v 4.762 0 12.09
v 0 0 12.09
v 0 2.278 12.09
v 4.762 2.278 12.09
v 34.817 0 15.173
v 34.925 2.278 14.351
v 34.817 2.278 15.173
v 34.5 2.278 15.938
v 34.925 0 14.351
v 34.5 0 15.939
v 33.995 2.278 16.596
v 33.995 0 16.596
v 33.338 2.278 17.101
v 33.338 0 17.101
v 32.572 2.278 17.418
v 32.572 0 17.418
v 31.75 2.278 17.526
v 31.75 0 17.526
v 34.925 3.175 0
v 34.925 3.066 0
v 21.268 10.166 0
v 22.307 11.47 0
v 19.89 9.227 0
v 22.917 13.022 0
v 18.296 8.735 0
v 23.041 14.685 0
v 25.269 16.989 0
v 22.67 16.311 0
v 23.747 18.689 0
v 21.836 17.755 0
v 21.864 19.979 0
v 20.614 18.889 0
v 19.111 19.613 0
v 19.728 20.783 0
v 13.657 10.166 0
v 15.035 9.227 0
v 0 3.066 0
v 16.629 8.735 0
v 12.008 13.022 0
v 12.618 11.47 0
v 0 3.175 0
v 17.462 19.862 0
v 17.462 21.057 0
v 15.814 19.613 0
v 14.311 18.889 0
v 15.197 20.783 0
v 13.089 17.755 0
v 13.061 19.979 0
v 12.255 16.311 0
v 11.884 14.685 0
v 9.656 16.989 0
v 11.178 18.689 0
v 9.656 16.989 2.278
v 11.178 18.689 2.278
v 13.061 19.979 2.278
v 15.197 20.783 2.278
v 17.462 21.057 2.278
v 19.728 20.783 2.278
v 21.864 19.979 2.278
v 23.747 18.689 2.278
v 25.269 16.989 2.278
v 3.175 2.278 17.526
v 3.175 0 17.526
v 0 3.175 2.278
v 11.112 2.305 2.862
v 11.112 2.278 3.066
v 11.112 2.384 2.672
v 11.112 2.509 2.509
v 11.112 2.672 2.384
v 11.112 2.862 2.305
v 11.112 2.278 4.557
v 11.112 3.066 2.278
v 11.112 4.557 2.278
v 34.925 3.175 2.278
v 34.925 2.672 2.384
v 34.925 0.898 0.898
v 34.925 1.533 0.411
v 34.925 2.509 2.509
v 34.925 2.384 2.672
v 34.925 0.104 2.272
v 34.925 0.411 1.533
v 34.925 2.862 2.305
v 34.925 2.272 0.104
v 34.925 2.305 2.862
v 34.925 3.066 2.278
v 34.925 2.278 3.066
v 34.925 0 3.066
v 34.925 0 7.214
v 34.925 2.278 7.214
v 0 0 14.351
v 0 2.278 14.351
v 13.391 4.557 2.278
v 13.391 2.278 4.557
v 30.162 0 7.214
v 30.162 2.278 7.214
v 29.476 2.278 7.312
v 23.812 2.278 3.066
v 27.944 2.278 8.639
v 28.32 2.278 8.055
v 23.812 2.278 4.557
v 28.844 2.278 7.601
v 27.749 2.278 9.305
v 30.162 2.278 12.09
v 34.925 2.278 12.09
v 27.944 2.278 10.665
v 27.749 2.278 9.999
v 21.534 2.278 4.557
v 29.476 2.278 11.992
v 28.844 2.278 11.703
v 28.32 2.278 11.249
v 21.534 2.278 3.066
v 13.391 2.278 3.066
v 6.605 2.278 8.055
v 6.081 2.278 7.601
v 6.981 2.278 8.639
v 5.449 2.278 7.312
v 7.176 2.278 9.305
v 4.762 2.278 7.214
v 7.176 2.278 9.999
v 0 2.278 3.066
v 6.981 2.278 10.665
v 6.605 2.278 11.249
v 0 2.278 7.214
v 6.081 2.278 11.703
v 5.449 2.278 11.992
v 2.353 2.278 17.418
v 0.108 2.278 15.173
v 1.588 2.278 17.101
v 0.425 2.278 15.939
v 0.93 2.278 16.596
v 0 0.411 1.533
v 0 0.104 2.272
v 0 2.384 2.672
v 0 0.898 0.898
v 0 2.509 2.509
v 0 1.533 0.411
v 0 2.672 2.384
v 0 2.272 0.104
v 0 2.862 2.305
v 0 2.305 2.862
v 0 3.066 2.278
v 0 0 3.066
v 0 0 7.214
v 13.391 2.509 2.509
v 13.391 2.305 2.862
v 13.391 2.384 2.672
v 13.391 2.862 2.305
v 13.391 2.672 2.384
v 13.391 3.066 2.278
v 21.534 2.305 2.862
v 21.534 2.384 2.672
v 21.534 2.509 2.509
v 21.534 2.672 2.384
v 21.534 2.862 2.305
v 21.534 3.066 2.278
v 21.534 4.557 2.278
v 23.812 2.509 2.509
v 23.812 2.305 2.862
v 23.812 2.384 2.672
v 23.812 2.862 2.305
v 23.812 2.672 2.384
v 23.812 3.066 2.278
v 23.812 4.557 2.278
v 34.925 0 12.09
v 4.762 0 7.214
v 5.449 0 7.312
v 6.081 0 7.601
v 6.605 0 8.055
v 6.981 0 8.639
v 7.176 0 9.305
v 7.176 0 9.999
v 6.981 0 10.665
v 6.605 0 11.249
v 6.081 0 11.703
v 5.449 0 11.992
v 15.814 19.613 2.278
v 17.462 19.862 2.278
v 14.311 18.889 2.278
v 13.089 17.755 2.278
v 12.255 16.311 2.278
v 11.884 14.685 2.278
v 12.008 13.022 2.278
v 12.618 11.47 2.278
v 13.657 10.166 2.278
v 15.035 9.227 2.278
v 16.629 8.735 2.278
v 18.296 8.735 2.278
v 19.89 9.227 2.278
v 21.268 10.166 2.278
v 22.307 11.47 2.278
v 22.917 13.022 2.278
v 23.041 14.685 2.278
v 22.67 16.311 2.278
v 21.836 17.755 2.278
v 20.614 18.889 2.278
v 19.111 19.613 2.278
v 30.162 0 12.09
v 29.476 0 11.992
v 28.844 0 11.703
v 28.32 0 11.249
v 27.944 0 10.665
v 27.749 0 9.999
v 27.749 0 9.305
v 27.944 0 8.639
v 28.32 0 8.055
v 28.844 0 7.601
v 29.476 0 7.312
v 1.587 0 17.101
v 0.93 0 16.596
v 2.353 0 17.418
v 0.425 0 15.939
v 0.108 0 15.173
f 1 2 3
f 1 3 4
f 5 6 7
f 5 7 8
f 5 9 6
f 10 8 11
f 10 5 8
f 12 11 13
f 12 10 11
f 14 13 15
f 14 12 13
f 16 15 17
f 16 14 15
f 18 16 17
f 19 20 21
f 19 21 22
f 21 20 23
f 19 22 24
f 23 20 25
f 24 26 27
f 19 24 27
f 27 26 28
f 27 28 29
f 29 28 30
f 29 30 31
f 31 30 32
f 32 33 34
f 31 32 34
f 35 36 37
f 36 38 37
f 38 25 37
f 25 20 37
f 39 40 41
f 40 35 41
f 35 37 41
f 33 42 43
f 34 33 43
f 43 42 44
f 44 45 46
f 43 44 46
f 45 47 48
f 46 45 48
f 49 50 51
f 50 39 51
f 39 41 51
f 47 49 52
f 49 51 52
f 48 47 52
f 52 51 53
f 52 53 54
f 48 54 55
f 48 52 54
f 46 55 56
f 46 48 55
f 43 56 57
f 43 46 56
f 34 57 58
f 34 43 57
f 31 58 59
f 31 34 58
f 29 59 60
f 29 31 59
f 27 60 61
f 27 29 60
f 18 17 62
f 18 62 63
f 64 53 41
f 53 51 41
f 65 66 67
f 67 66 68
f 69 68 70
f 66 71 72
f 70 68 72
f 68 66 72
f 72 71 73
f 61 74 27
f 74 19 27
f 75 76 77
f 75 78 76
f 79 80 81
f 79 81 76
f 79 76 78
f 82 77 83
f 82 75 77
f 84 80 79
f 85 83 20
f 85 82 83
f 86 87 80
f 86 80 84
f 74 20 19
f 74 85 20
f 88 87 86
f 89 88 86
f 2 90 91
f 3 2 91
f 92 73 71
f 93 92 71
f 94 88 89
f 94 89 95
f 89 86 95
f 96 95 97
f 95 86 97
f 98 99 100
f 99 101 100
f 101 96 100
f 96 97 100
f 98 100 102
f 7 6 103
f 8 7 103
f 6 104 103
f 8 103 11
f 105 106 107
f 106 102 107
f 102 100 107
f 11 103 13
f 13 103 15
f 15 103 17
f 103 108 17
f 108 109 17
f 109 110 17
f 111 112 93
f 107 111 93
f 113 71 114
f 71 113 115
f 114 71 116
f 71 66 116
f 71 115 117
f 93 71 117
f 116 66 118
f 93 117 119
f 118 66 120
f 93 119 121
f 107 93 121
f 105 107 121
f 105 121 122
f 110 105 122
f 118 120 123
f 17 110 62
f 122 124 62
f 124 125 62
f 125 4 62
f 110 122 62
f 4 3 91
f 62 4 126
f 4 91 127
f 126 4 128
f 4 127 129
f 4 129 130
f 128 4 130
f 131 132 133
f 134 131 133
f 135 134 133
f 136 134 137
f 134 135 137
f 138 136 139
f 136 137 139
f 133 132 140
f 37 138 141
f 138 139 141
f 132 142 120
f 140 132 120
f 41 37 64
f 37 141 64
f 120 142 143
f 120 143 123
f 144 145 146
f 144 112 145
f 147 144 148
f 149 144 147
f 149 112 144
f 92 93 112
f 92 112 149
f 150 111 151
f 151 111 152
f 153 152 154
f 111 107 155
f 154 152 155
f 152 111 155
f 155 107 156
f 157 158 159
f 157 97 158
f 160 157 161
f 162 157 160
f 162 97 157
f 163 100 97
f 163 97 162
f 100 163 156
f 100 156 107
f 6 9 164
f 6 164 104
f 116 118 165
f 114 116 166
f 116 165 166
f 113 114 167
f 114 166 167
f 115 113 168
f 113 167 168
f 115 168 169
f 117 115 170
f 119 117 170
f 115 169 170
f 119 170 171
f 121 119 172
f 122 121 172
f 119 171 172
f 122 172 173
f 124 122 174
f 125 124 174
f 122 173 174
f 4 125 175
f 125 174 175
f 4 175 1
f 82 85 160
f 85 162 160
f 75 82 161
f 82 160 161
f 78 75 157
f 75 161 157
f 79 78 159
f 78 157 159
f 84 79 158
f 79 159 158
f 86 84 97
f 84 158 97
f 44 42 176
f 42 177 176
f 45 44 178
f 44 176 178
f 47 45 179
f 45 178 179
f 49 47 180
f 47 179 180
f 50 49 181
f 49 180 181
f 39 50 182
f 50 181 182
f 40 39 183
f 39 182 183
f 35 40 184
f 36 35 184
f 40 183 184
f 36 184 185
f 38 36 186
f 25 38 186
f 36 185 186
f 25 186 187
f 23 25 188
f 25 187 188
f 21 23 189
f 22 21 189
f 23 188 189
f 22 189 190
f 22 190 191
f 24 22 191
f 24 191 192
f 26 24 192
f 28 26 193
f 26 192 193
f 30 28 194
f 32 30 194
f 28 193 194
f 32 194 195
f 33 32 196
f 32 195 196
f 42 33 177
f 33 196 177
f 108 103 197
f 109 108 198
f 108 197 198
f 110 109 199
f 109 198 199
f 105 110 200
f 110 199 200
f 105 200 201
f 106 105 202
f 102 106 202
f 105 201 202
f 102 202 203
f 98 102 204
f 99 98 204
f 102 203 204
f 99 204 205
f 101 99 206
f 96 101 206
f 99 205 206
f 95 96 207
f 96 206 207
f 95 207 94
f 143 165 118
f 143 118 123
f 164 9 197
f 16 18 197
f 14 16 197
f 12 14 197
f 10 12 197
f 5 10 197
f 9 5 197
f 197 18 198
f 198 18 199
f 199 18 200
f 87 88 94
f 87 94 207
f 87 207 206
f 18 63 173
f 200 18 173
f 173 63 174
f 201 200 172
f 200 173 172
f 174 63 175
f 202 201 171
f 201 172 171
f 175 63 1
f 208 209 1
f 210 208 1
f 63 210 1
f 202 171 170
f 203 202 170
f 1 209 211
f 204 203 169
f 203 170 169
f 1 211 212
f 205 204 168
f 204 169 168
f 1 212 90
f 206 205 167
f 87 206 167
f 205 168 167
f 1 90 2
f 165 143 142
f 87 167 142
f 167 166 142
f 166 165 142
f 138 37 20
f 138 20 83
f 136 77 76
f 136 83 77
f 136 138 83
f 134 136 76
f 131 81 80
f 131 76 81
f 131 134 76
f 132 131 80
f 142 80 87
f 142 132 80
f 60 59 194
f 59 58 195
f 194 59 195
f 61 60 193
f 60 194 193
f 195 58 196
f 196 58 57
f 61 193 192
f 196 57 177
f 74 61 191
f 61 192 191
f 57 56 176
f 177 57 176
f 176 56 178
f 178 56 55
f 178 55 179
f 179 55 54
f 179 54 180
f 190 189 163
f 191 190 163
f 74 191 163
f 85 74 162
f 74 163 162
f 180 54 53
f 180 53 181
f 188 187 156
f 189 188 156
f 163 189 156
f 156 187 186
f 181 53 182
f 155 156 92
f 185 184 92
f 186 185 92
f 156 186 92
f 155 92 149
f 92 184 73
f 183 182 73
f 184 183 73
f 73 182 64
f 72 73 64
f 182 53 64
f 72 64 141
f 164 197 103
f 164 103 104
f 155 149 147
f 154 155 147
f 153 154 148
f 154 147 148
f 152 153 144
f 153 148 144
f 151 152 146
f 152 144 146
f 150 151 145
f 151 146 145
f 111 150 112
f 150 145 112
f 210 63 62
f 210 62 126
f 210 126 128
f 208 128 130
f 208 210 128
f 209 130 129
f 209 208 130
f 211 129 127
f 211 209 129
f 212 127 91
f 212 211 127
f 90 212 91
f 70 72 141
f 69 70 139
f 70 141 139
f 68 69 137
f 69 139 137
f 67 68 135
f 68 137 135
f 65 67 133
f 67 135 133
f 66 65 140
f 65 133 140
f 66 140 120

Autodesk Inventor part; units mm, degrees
sketch "Sketch_1" plane through (0, 0, 0) normal (1, 0, 0) x (0, 1, 0)
  line L0 (0, 17.526) -> (0, 3.0658)
  arc A0 (0, 3.0658) -> (3.0658, 0) centre (3.0658, 3.0658) ccw
  line L1 (3.0658, 0) -> (25.2679, 0)
  line L2 (25.2679, 0) -> (25.2679, 2.2784)
  line L3 (25.2679, 2.2784) -> (3.0658, 2.2784)
  arc A1 (2.2784, 3.0658) -> (3.0658, 2.2784) centre (3.0658, 3.0658) ccw
  line L4 (2.2784, 3.0658) -> (2.2784, 17.526)
  line L5 (2.2784, 17.526) -> (0, 17.526)
extrude "Extrusion1" add sketch "Sketch_1" along normal blind 34.925
sketch "Sketch_2" plane through (0, 0, 0) normal (0, 0, 1) x (1, 0, 0)
  line L0 (-6.985, -2.1057) -> (41.91, -2.1057)
  line L1 (41.91, -2.1057) -> (41.91, 33.6906)
  line L2 (41.91, 33.6906) -> (-6.985, 33.6906)
  line L3 (-6.985, 33.6906) -> (-6.985, -2.1057)
  line L4 (-2.2193, 0) -> (37.1443, 0)
  line L5 (37.1443, 0) -> (25.2694, 16.9886)
  arc A0 (25.2694, 16.9886) -> (9.6556, 16.9886) centre (17.4625, 11.5316) ccw
  line L6 (9.6556, 16.9886) -> (-2.2193, 0)
extrude "Extrusion2" cut sketch "Sketch_2" along normal blind 3.4176
sketch "Sketch3" plane through (34.925, 3.0658, 0) normal (0, 0, -1) x (-1, 0, 0)
  point P0 (17.4625, 11.2014)
hole "Drilling 1" at (17.4625, 14.2672, 0) direction (0, 0, 1) diameter 11.1887 depth 3.4176
sketch "Sketch_6" plane through (0, 0, 0) normal (0, 1, 0) x (-1, 0, 0)
  line L0 (17.4625, 14.351) -> (17.4625, 22.352)
  line L1 (17.4625, 22.352) -> (-3.175, 22.352)
  line L2 (-3.175, 22.352) -> (-3.175, 17.526)
  arc A0 (0, 14.351) -> (-3.175, 17.526) centre (-3.175, 14.351) ccw
  line L3 (0, 14.351) -> (17.4625, 14.351)
extrude "Extrusion3" cut sketch "Sketch_6" along normal blind 3.4176
sketch "Sketch_7" plane through (0, 0, 0) normal (0, 1, 0) x (-1, 0, 0)
  line L0 (-31.75, 22.352) -> (-52.3875, 22.352)
  line L1 (-52.3875, 22.352) -> (-52.3875, 14.351)
  line L2 (-52.3875, 14.351) -> (-34.925, 14.351)
  arc A0 (-31.75, 17.526) -> (-34.925, 14.351) centre (-31.75, 14.351) ccw
  line L3 (-31.75, 17.526) -> (-31.75, 22.352)
extrude "Extrusion4" cut sketch "Sketch_7" along normal blind 3.4176
sketch "Sketch_8" plane through (0, 0, 0) normal (0, 1, 0) x (-1, 0, 0)
  line L0 (3.4925, 12.0904) -> (-4.7625, 12.0904)
  arc A0 (-4.7625, 12.0904) -> (-4.7625, 7.2136) centre (-4.7625, 9.652) ccw
  line L1 (-4.7625, 7.2136) -> (3.4925, 7.2136)
  line L2 (3.4925, 7.2136) -> (3.4925, 12.0904)
extrude "Extrusion5" cut sketch "Sketch_8" along normal blind 3.4176
sketch "Sketch_9" plane through (0, 0, 0) normal (0, 1, 0) x (-1, 0, 0)
  arc A0 (-30.1625, 7.2136) -> (-30.1625, 12.0904) centre (-30.1625, 9.652) ccw
  line L0 (-30.1625, 12.0904) -> (-38.4175, 12.0904)
  line L1 (-38.4175, 12.0904) -> (-38.4175, 7.2136)
  line L2 (-38.4175, 7.2136) -> (-30.1625, 7.2136)
extrude "Extrusion6" cut sketch "Sketch_9" along normal blind 3.4176
sketch "Sketch_10" plane through (11.1125, 0, 0) normal (1, 0, 0) x (0, 0, -1)
  arc A0 (-4.5568, 1.8456) -> (-1.8456, 4.5568) centre (-3.0658, 3.0658) ccw
  line L0 (-1.8456, 4.5568) -> (-2.2784, 4.5568)
  line L1 (-2.2784, 4.5568) -> (-4.5568, 2.2784)
  line L2 (-4.5568, 2.2784) -> (-4.5568, 1.8456)
extrude "Extrusion7" add sketch "Sketch_10" along normal blind 2.2784
sketch "Sketch_14" plane through (23.8125, 0, 0) normal (1, 0, 0) x (0, 0, -1)
  arc A0 (-4.5568, 1.8456) -> (-1.8456, 4.5568) centre (-3.0658, 3.0658) ccw
  line L0 (-1.8456, 4.5568) -> (-2.2784, 4.5568)
  line L1 (-2.2784, 4.5568) -> (-4.5568, 2.2784)
  line L2 (-4.5568, 2.2784) -> (-4.5568, 1.8456)
extrude "Extrusion8" add sketch "Sketch_14" against normal blind 2.2784
ref_plane "h1_XY" through (17.4625, 0, 17.526) normal (1, 0, 0) x (0, 0, -1)
ref_plane "h1_YZ" through (17.4625, 0, 17.526) normal (0, 0, -1) x (0, 1, 0)
ref_plane "h1_ZX" through (17.4625, 0, 17.526) normal (0, 1, 0) x (1, 0, 0)
ref_plane "d1_XY" through (17.4625, 8.6728, 0) normal (1, 0, 0) x (0, 0, -1)
ref_plane "d1_YZ" through (17.4625, 8.6728, 0) normal (0, 0, -1) x (0, 1, 0)
ref_plane "d1_ZX" through (17.4625, 8.6728, 0) normal (0, 1, 0) x (1, 0, 0)
ref_plane "h2_XY" through (17.4625, 2.2784, 17.526) normal (1, 0, 0) x (0, 0, -1)
ref_plane "h2_YZ" through (17.4625, 2.2784, 17.526) normal (0, 0, -1) x (0, 1, 0)
ref_plane "h2_ZX" through (17.4625, 2.2784, 17.526) normal (0, 1, 0) x (1, 0, 0)
ref_plane "d2_XY" through (17.4625, 19.8615, 0) normal (1, 0, 0) x (0, 0, -1)
ref_plane "d2_YZ" through (17.4625, 19.8615, 0) normal (0, 0, -1) x (0, 1, 0)
ref_plane "d2_ZX" through (17.4625, 19.8615, 0) normal (0, 1, 0) x (1, 0, 0)
ref_plane "h3_XY" through (17.4625, 14.2672, 2.2784) normal (1, 0, 0) x (0, 0, -1)
ref_plane "h3_YZ" through (17.4625, 14.2672, 2.2784) normal (0, 0, -1) x (0, 1, 0)
ref_plane "h3_ZX" through (17.4625, 14.2672, 2.2784) normal (0, 1, 0) x (1, 0, 0)
ref_plane "h4_XY" through (17.4625, 21.0566, 2.2784) normal (1, 0, 0) x (0, 0, -1)
ref_plane "h4_YZ" through (17.4625, 21.0566, 2.2784) normal (0, 0, -1) x (0, 1, 0)
ref_plane "h4_ZX" through (17.4625, 21.0566, 2.2784) normal (0, 1, 0) x (1, 0, 0)
ref_plane "h5_XY" through (34.925, 3.175, 0) normal (1, 0, 0) x (0, 0, -1)
ref_plane "h5_YZ" through (34.925, 3.175, 0) normal (0, 0, -1) x (0, 1, 0)
ref_plane "h5_ZX" through (34.925, 3.175, 0) normal (0, 1, 0) x (1, 0, 0)
ref_plane "h6_XY" through (34.925, 0, 0) normal (1, 0, 0) x (0, 0, -1)
ref_plane "h6_YZ" through (34.925, 0, 0) normal (0, 0, -1) x (0, 1, 0)
ref_plane "h6_ZX" through (34.925, 0, 0) normal (0, 1, 0) x (1, 0, 0)
ref_plane "l1_XY" through (0, 0, 0) normal (0, 1, 0) x (1, 0, 0)
ref_plane "l1_YZ" through (0, 0, 0) normal (1, 0, 0) x (0, 0, -1)
ref_plane "l1_ZX" through (0, 0, 0) normal (0, 0, -1) x (0, 1, 0)
ref_plane "l2_XY" through (34.925, 0, 0) normal (0, 1, 0) x (1, 0, 0)
ref_plane "l2_YZ" through (34.925, 0, 0) normal (1, 0, 0) x (0, 0, -1)
ref_plane "l2_ZX" through (34.925, 0, 0) normal (0, 0, -1) x (0, 1, 0)
ref_plane "l3_XY" through (0, 0, 17.526) normal (0, 1, 0) x (1, 0, 0)
ref_plane "l3_YZ" through (0, 0, 17.526) normal (1, 0, 0) x (0, 0, -1)
ref_plane "l3_ZX" through (0, 0, 17.526) normal (0, 0, -1) x (0, 1, 0)
ref_plane "l4_XY" through (0, 0, 9.652) normal (0, 1, 0) x (1, 0, 0)
ref_plane "l4_YZ" through (0, 0, 9.652) normal (1, 0, 0) x (0, 0, -1)
ref_plane "l4_ZX" through (0, 0, 9.652) normal (0, 0, -1) x (0, 1, 0)
ref_plane "l5_XY" through (4.7625, 0, 9.652) normal (0, 1, 0) x (1, 0, 0)
ref_plane "l5_YZ" through (4.7625, 0, 9.652) normal (1, 0, 0) x (0, 0, -1)
ref_plane "l5_ZX" through (4.7625, 0, 9.652) normal (0, 0, -1) x (0, 1, 0)
ref_plane "l6_XY" through (30.1625, 0, 9.652) normal (0, 1, 0) x (1, 0, 0)
ref_plane "l6_YZ" through (30.1625, 0, 9.652) normal (1, 0, 0) x (0, 0, -1)
ref_plane "l6_ZX" through (30.1625, 0, 9.652) normal (0, 0, -1) x (0, 1, 0)
ref_plane "l7_XY" through (30.1625, 0, 12.0904) normal (0, 1, 0) x (1, 0, 0)
ref_plane "l7_YZ" through (30.1625, 0, 12.0904) normal (1, 0, 0) x (0, 0, -1)
ref_plane "l7_ZX" through (30.1625, 0, 12.0904) normal (0, 0, -1) x (0, 1, 0)
ref_plane "l8_XY" through (30.1625, 0, 7.2136) normal (0, 1, 0) x (1, 0, 0)
ref_plane "l8_YZ" through (30.1625, 0, 7.2136) normal (1, 0, 0) x (0, 0, -1)
ref_plane "l8_ZX" through (30.1625, 0, 7.2136) normal (0, 0, -1) x (0, 1, 0)
ref_plane "mounting_bracket_XY" through (17.4625, 14.2672, 2.2784) normal (0, 0, 1) x (1, 0, 0)
ref_plane "mounting_bracket_YZ" through (17.4625, 14.2672, 2.2784) normal (1, 0, 0) x (0, 1, 0)
ref_plane "mounting_bracket_ZX" through (17.4625, 14.2672, 2.2784) normal (0, 1, 0) x (0, 0, 1)
ref_plane "mounting_bracket_1_XY" through (17.4625, 14.2672, 0) normal (0, 0, 1) x (1, 0, 0)
ref_plane "mounting_bracket_1_YZ" through (17.4625, 14.2672, 0) normal (1, 0, 0) x (0, 1, 0)
ref_plane "mounting_bracket_1_ZX" through (17.4625, 14.2672, 0) normal (0, 1, 0) x (0, 0, 1)
properties part number "D-770"
